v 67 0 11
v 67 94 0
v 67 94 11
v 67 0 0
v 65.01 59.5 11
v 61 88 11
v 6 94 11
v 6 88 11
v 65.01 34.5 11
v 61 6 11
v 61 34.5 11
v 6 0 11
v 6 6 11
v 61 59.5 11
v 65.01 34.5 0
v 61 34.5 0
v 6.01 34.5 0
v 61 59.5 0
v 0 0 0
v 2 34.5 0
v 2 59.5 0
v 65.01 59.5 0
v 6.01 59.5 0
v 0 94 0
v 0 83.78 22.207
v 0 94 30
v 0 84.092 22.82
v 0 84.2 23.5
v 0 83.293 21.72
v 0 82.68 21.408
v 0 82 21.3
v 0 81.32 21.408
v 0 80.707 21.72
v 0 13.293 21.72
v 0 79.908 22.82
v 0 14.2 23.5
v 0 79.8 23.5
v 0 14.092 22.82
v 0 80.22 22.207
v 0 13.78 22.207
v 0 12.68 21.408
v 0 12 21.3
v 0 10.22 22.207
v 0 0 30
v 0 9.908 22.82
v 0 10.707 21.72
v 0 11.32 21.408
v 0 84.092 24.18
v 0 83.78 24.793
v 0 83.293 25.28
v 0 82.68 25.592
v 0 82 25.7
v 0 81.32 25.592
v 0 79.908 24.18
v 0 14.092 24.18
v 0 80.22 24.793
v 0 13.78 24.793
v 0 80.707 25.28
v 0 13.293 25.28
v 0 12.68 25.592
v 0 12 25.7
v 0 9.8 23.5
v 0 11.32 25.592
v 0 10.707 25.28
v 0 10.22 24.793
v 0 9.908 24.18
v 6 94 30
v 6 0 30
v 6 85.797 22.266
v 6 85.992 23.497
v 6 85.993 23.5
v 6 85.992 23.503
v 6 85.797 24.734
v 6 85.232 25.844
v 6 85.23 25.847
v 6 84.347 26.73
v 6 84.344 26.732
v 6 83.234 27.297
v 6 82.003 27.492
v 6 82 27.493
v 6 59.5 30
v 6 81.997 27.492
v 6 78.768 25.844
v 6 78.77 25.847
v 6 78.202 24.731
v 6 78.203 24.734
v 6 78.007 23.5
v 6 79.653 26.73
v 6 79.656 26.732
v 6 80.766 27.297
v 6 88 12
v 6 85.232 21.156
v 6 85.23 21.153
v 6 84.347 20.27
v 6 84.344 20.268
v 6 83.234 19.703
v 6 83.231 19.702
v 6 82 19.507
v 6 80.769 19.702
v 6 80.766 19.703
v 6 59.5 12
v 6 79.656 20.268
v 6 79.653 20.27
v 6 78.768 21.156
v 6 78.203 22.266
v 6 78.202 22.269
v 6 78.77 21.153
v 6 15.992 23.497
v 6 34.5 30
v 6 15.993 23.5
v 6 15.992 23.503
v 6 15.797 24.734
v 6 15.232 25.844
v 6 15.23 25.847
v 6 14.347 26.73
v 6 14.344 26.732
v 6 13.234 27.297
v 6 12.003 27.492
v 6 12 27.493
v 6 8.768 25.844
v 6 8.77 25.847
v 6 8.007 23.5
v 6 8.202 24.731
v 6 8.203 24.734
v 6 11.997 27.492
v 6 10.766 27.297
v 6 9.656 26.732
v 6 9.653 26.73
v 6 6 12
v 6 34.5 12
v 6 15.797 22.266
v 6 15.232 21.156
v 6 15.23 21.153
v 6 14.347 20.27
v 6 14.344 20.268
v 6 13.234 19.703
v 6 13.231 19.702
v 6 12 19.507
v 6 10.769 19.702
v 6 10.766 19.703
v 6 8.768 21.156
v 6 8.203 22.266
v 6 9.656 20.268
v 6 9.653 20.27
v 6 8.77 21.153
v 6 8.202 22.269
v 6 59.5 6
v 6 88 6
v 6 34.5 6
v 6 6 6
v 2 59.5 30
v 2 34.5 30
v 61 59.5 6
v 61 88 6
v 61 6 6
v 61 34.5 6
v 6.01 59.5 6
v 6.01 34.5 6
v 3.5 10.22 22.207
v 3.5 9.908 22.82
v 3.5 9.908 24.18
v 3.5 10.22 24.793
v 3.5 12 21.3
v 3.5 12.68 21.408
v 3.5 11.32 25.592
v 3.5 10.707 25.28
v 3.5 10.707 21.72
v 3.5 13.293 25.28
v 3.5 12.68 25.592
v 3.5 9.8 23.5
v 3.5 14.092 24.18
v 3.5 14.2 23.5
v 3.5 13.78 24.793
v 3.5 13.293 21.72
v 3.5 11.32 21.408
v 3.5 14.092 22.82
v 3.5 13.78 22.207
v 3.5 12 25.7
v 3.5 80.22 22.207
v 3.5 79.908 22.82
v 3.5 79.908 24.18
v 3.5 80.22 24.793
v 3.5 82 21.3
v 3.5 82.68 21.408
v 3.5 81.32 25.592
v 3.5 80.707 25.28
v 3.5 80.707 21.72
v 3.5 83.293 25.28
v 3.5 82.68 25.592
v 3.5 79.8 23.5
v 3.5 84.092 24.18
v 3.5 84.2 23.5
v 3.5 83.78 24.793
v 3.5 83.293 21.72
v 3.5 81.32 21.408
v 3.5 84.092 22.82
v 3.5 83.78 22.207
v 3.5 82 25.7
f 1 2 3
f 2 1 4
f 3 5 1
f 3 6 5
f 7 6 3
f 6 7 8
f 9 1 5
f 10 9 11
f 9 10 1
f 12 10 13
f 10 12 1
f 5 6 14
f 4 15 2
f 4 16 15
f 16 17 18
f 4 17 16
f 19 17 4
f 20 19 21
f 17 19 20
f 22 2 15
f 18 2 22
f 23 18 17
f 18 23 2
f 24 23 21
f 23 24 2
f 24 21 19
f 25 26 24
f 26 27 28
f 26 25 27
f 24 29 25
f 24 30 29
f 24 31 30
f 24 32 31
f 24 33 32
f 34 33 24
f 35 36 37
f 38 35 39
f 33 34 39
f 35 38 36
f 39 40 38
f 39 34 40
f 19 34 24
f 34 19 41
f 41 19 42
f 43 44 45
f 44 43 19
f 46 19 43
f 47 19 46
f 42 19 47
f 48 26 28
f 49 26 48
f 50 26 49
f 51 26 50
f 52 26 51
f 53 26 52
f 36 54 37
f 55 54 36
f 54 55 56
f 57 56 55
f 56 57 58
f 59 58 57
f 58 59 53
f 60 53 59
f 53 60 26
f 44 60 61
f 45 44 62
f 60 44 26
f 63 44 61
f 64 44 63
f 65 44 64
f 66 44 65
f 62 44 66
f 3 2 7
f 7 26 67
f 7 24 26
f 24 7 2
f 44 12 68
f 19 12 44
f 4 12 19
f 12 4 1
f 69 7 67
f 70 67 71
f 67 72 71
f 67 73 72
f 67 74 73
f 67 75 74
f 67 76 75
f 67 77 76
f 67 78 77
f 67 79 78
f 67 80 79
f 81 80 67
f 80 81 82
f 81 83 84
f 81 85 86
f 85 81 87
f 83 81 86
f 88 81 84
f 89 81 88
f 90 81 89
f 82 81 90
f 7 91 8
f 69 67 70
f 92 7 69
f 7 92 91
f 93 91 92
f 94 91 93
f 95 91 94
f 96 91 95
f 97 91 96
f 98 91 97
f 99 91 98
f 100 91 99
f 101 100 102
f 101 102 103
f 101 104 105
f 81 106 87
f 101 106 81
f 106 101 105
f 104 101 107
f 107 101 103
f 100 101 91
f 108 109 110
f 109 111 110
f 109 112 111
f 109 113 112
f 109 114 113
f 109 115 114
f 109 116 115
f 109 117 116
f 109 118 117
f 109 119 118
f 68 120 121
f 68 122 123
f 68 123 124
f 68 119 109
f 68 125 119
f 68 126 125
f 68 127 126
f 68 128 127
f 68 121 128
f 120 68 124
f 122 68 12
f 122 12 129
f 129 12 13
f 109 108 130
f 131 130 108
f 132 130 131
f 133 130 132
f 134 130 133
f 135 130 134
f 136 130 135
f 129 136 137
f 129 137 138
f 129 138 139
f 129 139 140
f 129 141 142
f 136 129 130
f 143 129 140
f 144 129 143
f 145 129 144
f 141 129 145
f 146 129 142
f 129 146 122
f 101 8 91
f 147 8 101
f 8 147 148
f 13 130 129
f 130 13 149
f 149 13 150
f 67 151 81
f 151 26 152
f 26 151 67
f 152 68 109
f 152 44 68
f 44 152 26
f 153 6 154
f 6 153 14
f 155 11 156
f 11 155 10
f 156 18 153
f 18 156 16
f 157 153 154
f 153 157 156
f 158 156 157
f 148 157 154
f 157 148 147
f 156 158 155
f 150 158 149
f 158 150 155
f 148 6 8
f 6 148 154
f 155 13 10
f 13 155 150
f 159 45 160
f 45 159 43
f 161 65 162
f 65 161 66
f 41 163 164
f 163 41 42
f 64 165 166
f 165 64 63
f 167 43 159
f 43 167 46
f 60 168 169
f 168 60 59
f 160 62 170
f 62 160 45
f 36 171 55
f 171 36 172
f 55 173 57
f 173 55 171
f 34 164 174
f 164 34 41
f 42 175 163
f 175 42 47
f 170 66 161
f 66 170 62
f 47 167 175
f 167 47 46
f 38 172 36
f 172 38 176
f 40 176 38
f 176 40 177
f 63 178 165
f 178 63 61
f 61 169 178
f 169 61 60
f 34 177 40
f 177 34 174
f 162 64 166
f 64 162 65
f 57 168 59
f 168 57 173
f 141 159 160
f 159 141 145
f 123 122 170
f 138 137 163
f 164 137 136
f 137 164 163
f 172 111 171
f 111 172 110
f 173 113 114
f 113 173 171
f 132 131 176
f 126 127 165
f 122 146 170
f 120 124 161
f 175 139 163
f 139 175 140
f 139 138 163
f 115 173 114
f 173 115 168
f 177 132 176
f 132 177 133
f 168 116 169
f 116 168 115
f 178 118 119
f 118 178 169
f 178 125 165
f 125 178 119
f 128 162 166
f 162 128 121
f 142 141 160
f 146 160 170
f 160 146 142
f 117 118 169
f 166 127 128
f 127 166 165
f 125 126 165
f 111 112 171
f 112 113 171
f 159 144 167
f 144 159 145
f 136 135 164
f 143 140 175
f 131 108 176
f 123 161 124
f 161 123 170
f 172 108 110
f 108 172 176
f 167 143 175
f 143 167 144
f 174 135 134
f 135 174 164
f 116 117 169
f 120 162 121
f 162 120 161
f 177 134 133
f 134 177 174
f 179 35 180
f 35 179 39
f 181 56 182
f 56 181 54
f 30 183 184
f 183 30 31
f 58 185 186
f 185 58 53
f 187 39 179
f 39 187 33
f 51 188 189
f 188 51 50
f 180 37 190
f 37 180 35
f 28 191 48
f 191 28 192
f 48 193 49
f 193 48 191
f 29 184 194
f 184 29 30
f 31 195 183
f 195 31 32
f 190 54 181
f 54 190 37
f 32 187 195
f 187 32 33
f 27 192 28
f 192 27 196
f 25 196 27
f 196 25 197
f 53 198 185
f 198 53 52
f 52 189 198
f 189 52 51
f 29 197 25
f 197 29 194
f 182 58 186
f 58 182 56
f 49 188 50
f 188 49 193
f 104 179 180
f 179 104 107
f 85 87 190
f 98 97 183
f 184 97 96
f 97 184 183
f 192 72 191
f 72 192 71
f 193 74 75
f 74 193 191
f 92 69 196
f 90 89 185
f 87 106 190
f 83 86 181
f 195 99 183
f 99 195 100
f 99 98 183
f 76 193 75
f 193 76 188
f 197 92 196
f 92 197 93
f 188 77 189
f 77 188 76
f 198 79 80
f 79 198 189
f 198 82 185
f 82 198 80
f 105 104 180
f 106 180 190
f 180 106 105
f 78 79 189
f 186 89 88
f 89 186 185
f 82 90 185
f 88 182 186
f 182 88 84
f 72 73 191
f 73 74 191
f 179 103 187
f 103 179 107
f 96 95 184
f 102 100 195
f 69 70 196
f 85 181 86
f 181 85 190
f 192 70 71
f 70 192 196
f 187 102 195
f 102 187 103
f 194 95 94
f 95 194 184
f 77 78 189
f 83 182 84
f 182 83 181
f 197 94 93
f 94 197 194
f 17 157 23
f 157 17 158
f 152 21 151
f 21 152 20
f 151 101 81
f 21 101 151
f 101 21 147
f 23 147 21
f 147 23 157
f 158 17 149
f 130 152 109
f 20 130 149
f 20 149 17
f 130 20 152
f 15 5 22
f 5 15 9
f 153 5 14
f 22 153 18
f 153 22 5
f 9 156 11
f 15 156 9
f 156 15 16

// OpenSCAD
psu_w = 55;
psu_l = 82;

lip_h = 5;

wall_w = 6;

hole_d = 3.4 + 1;

head_d = 7.0 + 1;
head_h = 2.5;

strap_hole_l = 25;
strap_hole_w = 4;

hook_h = 30;

hole_wall_dist = 12;

difference(){
    
    union(){
        cube( [ psu_w + 2 * wall_w, psu_l + 2 * wall_w, lip_h + wall_w ] );
        cube( [ wall_w, psu_l + 2 * wall_w, hook_h ] );
    }
    translate( [ wall_w, wall_w, wall_w ] )
        cube( [ psu_w, psu_l, lip_h + 1 ] );
    
    translate( [ -1, hole_wall_dist, hook_h - ( hook_h - lip_h ) / 2 + wall_w ] )
        rotate( 90, [ 0, 1, 0 ] )
            cylinder( d = hole_d, h = wall_w + 2, $fn = 20 );
    translate( [ wall_w - head_h, hole_wall_dist, hook_h - ( hook_h - lip_h ) / 2 + wall_w ] )
        rotate( 90, [ 0, 1, 0 ] )
            cylinder( d2 = head_d, d1 = hole_d, h = head_h + 1e-2, $fn = 20 );

    translate( [ -1, psu_l + 2 * wall_w - hole_wall_dist, hook_h - ( hook_h - lip_h ) / 2 + wall_w ] )
        rotate( 90, [ 0, 1, 0 ] )
            cylinder( d = hole_d, h = wall_w + 2, $fn = 20 );
    translate( [ wall_w - head_h, psu_l + 2 * wall_w - hole_wall_dist, hook_h - ( hook_h - lip_h ) / 2 + wall_w ] )
        rotate( 90, [ 0, 1, 0 ] )
            cylinder( d2 = head_d, d1 = hole_d, h = head_h + 1e-2, $fn = 20 );
    
    translate( [ wall_w - strap_hole_w, ( psu_l + 2 * wall_w ) / 2 - strap_hole_l / 2, -1 ] )
        cube( [ strap_hole_w + 1e-2, strap_hole_l, hook_h + 2 ] );
    translate( [ wall_w + psu_w, ( psu_l + 2 * wall_w ) / 2 - strap_hole_l / 2, -1 ] )
        cube( [ strap_hole_w + 1e-2, strap_hole_l, hook_h + 2 ] );
}
